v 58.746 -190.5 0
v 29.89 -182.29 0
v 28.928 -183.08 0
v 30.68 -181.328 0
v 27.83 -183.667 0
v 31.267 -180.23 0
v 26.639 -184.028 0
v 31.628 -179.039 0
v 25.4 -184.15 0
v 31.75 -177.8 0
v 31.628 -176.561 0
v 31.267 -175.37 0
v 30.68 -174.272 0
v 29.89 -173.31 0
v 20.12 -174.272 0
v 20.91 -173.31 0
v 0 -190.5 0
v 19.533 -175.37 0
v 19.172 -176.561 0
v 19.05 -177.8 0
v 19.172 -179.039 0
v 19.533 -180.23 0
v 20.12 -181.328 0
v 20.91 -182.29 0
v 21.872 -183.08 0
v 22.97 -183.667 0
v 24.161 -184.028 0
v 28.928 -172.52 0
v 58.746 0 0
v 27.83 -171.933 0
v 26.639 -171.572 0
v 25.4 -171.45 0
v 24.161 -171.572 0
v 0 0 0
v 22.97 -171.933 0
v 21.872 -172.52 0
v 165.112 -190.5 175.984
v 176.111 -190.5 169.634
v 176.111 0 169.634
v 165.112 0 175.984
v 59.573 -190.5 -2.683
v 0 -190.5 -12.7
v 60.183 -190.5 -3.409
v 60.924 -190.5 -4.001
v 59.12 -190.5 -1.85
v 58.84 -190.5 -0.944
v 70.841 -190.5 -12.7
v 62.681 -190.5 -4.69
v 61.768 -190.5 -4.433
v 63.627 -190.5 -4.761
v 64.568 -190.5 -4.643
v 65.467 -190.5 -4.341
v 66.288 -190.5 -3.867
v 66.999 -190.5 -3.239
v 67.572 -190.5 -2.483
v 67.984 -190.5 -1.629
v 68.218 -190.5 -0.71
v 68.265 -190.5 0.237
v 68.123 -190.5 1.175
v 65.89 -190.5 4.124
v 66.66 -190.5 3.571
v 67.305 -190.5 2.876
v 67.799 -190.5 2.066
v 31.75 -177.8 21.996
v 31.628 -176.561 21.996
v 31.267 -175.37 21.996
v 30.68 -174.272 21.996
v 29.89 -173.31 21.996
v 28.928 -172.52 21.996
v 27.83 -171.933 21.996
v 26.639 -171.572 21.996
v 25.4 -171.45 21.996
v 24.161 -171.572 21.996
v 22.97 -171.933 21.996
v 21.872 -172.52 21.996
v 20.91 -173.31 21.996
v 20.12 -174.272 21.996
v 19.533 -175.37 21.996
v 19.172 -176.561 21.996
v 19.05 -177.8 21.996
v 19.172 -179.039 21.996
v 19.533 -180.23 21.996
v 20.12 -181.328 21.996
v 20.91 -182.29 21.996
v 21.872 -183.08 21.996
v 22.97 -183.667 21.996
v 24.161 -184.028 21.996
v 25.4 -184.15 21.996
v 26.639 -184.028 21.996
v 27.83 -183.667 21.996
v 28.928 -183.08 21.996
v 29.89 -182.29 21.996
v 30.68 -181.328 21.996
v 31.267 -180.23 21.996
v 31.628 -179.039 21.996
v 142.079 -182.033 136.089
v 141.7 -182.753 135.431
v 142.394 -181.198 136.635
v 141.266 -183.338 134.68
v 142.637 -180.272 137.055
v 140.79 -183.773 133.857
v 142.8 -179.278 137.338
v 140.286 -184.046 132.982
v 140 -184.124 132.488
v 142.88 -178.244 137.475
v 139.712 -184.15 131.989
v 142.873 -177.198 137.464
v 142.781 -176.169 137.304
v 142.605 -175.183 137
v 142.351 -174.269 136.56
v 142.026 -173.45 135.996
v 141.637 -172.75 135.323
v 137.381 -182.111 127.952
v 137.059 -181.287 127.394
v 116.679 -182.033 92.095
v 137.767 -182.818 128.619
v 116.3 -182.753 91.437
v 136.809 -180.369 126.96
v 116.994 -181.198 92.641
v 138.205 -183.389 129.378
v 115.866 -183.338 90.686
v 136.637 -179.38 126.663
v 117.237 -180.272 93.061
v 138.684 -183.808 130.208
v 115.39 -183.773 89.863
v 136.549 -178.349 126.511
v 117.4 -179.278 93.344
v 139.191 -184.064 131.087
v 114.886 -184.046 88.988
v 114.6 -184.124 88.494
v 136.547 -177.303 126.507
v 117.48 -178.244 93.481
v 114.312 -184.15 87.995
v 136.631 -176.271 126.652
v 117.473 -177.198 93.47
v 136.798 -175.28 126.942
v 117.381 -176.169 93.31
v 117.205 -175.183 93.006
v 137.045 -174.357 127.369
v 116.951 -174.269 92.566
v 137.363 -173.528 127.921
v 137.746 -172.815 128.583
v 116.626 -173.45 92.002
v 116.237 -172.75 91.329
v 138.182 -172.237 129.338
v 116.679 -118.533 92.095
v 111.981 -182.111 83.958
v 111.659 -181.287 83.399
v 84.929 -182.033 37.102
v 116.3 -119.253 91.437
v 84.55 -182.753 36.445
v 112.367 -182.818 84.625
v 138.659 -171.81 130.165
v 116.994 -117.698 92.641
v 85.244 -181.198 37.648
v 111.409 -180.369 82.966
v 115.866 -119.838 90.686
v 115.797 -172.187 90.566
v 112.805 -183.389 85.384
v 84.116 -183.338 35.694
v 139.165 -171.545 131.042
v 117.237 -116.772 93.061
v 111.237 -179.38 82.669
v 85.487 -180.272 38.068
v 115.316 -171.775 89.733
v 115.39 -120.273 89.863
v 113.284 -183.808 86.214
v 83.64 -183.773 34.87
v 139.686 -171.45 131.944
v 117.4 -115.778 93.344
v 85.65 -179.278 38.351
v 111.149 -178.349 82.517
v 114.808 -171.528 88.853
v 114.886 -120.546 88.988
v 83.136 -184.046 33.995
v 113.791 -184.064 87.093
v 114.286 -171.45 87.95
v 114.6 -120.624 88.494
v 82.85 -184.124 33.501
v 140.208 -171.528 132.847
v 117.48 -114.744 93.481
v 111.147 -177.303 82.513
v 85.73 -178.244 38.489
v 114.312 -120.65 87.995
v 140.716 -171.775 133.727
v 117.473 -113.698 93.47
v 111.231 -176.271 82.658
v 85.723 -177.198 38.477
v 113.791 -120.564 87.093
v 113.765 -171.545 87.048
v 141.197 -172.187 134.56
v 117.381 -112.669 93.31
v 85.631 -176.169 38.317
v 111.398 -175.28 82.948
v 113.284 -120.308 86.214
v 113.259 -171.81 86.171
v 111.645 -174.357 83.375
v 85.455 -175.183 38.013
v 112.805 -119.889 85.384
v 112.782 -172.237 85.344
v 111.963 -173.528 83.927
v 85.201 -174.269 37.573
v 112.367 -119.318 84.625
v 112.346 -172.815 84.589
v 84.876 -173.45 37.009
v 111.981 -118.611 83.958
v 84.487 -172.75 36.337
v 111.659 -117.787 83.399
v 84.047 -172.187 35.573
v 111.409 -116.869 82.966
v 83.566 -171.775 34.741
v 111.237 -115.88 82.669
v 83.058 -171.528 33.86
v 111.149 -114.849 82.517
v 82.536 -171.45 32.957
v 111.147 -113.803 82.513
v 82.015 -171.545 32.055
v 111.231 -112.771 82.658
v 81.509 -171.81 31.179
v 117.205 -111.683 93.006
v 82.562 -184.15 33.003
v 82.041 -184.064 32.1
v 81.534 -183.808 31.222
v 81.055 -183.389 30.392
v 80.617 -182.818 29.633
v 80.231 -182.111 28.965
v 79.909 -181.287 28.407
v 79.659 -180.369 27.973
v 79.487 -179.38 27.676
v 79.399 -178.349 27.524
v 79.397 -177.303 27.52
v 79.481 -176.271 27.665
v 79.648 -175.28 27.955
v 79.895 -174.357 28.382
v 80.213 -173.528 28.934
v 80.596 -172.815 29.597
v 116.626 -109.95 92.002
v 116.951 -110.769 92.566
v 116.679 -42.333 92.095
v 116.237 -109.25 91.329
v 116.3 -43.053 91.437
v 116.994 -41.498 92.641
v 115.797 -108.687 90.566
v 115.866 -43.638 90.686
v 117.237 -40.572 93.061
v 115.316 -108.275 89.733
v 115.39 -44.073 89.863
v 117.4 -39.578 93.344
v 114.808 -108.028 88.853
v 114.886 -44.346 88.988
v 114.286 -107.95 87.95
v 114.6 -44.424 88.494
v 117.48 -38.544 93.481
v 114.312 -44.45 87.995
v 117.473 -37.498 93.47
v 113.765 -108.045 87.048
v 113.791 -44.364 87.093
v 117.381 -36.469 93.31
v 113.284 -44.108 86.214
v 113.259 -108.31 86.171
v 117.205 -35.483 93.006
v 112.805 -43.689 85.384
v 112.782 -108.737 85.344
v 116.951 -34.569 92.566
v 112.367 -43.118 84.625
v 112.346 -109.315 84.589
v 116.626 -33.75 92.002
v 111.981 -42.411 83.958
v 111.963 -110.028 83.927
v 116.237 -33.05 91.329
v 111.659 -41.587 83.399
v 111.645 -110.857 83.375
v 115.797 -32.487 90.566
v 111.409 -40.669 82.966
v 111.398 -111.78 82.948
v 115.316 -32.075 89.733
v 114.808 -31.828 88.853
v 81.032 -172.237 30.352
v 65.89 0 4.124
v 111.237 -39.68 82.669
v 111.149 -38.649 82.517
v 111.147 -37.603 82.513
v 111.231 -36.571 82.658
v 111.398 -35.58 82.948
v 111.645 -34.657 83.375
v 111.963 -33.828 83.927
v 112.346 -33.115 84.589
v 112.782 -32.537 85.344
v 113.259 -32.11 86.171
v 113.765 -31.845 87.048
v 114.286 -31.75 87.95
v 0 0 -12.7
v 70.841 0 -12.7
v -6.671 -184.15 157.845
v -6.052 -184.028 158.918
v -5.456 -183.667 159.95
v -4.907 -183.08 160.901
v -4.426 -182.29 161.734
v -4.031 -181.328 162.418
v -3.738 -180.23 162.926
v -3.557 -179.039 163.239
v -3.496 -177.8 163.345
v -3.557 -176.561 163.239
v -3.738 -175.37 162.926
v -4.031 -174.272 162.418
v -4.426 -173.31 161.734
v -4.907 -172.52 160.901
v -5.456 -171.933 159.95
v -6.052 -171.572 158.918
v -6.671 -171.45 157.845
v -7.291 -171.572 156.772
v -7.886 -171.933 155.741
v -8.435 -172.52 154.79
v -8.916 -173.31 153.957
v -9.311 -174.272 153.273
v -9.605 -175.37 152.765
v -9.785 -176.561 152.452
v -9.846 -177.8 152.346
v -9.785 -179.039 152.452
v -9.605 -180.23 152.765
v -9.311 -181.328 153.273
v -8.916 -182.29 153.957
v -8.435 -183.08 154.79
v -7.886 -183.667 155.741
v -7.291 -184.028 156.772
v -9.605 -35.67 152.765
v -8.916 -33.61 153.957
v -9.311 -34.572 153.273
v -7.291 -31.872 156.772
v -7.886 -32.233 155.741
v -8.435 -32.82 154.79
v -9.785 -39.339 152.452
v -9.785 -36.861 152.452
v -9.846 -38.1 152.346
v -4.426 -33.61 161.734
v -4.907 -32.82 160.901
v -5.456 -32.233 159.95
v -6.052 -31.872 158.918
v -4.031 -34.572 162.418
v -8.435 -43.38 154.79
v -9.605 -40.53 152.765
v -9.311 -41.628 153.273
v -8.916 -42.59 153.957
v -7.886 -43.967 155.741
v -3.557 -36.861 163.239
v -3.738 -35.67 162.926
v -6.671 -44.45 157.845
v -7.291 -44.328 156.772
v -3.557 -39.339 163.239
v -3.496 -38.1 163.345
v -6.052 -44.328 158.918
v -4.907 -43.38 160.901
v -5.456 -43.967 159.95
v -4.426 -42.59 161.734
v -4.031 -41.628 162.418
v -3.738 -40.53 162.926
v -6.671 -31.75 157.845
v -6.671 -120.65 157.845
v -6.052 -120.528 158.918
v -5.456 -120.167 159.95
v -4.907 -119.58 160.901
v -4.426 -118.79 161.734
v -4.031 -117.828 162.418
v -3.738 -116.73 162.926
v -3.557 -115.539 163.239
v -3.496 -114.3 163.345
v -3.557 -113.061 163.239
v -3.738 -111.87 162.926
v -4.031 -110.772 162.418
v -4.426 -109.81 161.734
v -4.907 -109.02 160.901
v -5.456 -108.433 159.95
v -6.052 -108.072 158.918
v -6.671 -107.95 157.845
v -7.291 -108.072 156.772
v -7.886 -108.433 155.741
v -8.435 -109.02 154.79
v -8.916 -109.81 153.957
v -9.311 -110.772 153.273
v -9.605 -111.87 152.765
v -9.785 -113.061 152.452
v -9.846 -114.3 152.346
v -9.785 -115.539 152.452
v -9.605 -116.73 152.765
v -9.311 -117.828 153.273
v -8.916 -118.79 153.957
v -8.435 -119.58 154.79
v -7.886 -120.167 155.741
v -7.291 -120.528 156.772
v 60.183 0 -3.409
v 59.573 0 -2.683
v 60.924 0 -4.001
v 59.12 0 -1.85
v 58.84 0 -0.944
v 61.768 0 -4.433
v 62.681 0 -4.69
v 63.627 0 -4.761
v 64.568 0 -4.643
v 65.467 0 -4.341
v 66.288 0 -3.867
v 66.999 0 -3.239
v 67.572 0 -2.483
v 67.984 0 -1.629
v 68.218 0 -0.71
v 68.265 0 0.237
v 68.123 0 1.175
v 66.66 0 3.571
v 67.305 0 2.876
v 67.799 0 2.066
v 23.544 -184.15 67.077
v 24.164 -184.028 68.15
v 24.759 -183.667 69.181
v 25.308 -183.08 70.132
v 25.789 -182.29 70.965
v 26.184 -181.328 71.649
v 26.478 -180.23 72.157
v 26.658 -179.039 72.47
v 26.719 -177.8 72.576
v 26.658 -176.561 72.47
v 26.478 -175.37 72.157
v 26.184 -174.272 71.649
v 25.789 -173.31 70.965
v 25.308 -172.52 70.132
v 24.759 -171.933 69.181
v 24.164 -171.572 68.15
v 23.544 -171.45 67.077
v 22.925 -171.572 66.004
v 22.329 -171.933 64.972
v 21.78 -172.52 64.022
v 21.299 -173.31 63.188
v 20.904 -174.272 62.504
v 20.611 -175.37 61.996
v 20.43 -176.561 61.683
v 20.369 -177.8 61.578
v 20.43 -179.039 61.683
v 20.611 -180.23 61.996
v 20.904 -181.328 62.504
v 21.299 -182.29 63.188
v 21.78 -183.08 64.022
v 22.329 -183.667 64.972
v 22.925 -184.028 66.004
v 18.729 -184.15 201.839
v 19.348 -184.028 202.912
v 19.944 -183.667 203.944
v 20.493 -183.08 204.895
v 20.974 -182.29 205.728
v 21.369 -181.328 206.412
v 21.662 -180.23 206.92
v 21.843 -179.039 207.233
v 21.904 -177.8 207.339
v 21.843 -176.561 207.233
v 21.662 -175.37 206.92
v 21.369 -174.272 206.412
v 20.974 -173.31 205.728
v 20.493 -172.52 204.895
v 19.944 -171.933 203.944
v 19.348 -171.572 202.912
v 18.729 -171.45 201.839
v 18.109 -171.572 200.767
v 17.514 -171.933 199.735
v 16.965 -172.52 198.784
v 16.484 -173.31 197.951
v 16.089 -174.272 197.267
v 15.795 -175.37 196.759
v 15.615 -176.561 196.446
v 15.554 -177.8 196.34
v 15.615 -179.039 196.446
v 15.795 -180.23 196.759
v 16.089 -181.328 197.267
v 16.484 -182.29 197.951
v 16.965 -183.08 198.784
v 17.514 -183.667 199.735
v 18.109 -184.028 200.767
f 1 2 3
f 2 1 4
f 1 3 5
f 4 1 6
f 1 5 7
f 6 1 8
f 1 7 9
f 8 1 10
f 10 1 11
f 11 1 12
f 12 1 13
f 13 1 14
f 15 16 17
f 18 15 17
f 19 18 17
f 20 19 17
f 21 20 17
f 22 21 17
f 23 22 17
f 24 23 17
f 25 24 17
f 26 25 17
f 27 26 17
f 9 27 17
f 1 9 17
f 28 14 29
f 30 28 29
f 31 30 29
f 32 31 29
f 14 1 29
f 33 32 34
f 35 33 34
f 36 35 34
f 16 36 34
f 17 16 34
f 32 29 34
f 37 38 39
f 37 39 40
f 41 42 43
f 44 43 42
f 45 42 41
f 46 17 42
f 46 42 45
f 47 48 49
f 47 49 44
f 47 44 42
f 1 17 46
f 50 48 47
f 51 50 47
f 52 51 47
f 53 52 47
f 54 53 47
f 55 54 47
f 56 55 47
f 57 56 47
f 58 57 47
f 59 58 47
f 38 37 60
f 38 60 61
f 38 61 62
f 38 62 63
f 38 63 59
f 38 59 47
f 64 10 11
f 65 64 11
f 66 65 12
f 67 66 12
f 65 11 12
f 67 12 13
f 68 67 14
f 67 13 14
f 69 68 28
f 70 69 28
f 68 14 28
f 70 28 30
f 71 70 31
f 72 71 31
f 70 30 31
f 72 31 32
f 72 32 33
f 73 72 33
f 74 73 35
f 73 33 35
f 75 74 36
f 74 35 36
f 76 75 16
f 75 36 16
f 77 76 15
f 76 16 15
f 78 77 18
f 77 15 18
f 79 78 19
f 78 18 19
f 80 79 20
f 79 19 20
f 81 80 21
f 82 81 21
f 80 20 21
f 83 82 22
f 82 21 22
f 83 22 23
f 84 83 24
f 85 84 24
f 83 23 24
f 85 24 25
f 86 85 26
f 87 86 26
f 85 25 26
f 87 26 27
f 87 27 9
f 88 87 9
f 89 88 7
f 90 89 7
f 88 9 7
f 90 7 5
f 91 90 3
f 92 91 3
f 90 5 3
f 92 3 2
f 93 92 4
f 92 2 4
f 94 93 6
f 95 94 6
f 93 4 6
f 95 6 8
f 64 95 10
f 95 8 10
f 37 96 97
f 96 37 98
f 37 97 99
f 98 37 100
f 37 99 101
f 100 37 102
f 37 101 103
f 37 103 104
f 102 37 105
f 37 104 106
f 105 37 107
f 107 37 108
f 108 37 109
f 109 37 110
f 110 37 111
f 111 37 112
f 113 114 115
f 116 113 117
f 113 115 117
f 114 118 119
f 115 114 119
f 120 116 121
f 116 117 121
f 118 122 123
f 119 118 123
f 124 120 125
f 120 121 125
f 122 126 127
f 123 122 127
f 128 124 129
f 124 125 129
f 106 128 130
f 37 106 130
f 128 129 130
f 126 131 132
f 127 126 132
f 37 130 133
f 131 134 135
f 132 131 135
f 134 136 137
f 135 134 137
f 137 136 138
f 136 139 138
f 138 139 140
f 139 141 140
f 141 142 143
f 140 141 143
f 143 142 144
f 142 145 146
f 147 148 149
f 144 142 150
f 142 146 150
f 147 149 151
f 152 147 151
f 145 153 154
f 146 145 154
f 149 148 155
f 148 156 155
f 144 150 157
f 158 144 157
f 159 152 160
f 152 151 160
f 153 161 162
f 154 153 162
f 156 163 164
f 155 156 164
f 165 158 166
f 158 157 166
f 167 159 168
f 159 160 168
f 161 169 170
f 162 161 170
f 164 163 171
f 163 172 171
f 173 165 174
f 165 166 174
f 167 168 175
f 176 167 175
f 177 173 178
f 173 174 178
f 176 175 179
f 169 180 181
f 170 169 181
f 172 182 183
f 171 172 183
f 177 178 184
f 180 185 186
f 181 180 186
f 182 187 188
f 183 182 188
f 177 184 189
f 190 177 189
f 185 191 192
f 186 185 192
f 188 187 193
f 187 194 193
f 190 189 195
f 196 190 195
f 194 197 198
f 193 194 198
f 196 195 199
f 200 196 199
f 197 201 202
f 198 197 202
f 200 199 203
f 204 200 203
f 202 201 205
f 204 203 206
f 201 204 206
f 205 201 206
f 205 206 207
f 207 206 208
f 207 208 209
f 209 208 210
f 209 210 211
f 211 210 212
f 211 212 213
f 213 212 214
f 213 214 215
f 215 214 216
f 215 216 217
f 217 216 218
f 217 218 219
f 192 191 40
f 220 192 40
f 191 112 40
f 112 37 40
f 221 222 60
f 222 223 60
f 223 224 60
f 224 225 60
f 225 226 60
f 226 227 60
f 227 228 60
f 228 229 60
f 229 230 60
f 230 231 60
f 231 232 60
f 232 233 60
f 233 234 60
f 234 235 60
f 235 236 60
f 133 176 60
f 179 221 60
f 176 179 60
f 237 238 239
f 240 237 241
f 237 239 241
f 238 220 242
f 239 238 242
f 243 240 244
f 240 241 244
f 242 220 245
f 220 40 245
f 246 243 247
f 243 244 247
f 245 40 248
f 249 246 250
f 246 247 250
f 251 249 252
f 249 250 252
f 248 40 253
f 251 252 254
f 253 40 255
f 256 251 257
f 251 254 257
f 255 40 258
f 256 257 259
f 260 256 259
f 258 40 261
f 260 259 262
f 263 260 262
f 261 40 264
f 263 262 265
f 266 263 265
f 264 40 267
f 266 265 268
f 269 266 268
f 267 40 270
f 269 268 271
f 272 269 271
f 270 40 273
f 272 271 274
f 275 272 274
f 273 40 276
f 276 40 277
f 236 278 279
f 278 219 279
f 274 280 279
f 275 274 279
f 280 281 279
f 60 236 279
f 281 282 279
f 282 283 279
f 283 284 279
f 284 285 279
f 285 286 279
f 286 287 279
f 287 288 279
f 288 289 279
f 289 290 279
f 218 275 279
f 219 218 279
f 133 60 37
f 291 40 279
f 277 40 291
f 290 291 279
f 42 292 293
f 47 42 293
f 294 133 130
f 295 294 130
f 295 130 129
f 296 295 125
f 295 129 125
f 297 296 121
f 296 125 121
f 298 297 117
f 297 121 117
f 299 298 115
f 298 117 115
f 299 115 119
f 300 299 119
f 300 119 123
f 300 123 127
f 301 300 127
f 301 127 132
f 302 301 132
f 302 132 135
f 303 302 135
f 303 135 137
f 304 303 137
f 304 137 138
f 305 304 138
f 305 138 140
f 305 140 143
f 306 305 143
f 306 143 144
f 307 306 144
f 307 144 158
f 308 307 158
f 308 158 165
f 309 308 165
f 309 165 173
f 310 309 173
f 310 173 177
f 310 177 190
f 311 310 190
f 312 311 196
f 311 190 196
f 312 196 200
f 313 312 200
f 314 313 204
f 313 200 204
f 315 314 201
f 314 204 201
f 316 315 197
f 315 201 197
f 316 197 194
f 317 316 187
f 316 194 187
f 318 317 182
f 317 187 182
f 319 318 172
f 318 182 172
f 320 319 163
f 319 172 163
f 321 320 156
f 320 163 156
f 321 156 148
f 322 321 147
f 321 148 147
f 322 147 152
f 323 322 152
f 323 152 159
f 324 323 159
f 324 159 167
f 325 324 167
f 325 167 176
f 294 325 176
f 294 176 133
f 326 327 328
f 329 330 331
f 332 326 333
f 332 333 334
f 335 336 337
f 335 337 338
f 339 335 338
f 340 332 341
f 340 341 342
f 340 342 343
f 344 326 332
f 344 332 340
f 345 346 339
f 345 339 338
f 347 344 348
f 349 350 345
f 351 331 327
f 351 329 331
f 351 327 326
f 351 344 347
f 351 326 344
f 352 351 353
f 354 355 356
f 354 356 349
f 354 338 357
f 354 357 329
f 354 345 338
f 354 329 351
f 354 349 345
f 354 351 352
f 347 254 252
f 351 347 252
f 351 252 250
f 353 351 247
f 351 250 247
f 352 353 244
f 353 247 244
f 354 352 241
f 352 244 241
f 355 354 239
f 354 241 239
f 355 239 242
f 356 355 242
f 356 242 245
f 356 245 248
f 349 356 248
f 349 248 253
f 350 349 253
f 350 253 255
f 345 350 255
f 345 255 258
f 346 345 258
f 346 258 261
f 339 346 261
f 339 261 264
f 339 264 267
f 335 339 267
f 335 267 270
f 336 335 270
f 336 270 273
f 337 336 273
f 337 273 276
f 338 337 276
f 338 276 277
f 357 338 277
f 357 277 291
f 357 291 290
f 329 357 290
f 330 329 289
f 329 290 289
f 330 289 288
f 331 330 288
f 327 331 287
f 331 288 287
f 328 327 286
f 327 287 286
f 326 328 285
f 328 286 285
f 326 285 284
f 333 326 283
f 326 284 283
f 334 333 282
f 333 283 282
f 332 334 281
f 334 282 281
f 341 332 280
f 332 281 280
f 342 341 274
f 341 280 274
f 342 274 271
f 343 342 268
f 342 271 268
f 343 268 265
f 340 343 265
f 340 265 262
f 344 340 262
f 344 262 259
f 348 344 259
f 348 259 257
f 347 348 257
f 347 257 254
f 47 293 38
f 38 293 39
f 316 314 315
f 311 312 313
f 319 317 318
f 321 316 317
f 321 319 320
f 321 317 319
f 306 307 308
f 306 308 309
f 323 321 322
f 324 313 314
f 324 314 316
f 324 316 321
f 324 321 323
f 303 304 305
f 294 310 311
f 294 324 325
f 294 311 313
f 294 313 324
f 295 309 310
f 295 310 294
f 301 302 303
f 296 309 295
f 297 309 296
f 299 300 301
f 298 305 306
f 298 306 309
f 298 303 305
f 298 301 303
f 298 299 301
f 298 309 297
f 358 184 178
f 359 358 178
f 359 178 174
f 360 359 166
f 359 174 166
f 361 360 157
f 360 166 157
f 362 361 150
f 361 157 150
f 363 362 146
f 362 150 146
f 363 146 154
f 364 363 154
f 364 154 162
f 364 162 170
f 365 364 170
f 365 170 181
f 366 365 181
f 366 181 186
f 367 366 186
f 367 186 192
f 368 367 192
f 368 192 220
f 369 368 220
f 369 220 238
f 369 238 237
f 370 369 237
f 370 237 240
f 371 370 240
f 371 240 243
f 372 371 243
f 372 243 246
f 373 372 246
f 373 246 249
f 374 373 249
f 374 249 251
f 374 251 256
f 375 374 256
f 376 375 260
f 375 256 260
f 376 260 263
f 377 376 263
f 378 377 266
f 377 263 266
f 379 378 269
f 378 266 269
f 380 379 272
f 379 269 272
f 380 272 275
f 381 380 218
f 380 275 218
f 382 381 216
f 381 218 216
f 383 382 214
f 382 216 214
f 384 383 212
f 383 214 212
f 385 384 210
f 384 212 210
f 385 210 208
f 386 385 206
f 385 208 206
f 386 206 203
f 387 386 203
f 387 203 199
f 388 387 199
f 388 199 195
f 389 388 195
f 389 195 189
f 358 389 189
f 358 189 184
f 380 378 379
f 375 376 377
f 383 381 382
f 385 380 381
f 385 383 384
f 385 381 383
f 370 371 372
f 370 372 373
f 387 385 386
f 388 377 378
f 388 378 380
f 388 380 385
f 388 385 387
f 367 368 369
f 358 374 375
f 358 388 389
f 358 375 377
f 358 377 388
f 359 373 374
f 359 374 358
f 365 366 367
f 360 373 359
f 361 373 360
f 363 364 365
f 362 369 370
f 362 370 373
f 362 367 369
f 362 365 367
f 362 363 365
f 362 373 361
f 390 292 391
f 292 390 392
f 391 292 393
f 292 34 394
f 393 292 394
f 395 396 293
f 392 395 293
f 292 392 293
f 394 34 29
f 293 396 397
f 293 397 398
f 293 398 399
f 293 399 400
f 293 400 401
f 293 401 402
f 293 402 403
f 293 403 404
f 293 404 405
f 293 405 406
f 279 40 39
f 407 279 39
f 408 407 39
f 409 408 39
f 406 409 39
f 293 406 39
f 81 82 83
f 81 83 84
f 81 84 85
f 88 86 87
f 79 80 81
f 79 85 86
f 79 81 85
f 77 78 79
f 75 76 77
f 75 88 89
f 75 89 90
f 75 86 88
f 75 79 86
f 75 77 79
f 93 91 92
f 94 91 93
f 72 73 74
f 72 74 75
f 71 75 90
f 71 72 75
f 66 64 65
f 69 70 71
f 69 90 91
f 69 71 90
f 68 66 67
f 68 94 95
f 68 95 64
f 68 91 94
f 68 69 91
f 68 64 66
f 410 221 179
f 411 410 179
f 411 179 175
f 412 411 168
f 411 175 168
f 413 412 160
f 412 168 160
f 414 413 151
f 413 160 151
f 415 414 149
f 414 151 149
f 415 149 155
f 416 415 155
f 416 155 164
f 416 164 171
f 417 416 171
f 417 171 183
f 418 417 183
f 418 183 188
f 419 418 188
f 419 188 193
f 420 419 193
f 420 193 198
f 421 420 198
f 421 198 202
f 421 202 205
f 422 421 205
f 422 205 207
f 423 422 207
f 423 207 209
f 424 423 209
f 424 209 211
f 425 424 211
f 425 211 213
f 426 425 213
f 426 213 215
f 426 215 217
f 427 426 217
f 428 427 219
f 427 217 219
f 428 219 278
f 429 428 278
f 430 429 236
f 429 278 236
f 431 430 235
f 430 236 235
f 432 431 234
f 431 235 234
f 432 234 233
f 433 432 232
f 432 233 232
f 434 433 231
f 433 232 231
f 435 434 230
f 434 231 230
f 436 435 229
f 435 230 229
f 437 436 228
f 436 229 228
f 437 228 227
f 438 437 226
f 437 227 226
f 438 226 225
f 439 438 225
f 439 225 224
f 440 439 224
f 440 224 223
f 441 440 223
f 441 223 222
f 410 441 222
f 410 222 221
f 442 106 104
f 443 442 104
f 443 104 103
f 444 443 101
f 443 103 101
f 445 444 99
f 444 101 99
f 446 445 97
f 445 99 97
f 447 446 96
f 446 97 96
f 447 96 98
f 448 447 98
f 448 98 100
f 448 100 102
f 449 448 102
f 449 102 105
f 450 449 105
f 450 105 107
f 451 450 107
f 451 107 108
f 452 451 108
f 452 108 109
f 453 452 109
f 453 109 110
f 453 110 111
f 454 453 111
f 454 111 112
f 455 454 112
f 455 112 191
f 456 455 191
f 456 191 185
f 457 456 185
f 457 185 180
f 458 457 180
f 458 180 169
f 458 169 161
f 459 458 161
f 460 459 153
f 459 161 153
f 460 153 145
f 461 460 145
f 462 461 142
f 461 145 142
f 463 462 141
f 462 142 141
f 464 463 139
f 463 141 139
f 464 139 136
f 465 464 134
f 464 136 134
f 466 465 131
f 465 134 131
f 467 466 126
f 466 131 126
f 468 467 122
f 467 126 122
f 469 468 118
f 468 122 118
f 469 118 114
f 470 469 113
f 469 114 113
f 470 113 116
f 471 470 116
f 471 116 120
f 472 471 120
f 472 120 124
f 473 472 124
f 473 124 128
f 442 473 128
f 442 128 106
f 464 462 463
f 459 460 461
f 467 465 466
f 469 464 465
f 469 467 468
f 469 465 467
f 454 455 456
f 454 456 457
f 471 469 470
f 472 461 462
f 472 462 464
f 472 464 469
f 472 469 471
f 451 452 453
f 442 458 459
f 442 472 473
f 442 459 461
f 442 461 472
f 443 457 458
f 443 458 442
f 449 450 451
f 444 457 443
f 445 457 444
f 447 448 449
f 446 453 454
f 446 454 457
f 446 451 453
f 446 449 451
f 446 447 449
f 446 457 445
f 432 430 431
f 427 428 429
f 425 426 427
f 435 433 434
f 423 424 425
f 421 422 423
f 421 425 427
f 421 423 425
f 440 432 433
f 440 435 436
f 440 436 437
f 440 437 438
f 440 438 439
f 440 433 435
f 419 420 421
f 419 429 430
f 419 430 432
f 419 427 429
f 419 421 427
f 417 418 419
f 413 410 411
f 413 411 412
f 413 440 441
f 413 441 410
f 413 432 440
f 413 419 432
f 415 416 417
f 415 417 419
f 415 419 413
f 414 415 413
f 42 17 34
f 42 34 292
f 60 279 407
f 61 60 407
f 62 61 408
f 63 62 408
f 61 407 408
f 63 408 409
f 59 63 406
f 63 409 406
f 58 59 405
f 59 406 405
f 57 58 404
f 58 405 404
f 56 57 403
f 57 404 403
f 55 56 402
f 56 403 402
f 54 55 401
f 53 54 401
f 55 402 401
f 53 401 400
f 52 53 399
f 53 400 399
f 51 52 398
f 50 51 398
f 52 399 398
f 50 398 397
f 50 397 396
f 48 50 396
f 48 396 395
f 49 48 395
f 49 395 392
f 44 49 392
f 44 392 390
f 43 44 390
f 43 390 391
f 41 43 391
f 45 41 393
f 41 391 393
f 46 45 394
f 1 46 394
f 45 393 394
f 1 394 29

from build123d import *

# Parameters (mm, degrees)
F1_DEPTH = 190.5
F2_R     = 6.35
F4_DEPTH = 21.9964
F3_R     = 6.35
F5_DEPTH = 68.1482
F6_DEPTH = 139.7


with BuildPart() as f1:
    # F0 (on Front) → F1 (new body)
    with BuildSketch(Plane.XZ):
        with BuildLine():
            Line((58.745752, 0), (0, 0))
            Line((0, 0), (0, -12.7))
            Line((0, -12.7), (70.8406, -12.7))
            Line((70.8406, -12.7), (176.1109, 169.633508))
            Line((176.1109, 169.633508), (165.112377, 175.983508))
            Line((165.112377, 175.983508), (65.889502, 4.124446))
            ThreePointArc((65.889502, 4.124446), (65.889502, -4.124446), (58.745752, 0))
        make_face()
    extrude(amount=F1_DEPTH)

    # F2 (on face) → F4 (join)
    with BuildSketch(Plane.XY):
        with Locations((25.4, -177.8)):
            Circle(F2_R)
    extrude(amount=F4_DEPTH)

    # F3 (on face) → F5 (join)
    with BuildSketch(Plane(origin=(47.631189, 0, -27.49988), x_dir=(0, -1, 0), z_dir=(-0.866025, 0, 0.5))):
        with Locations((177.8, 69.862377)):
            Circle(F3_R)
    extrude(amount=F5_DEPTH)

    # F3 (on face) → F6 (join)
    with BuildSketch(Plane(origin=(47.631189, 0, -27.49988), x_dir=(0, -1, 0), z_dir=(-0.866025, 0, 0.5))):
        with Locations((177.8, 133.362377)):
            Circle(F3_R)
        with Locations((114.3, 133.362377)):
            Circle(F3_R)
        with Locations((38.1, 133.362377)):
            Circle(F3_R)
        with Locations((177.8, 184.162377)):
            Circle(F3_R)
    extrude(amount=F6_DEPTH)


solid = f1.part
